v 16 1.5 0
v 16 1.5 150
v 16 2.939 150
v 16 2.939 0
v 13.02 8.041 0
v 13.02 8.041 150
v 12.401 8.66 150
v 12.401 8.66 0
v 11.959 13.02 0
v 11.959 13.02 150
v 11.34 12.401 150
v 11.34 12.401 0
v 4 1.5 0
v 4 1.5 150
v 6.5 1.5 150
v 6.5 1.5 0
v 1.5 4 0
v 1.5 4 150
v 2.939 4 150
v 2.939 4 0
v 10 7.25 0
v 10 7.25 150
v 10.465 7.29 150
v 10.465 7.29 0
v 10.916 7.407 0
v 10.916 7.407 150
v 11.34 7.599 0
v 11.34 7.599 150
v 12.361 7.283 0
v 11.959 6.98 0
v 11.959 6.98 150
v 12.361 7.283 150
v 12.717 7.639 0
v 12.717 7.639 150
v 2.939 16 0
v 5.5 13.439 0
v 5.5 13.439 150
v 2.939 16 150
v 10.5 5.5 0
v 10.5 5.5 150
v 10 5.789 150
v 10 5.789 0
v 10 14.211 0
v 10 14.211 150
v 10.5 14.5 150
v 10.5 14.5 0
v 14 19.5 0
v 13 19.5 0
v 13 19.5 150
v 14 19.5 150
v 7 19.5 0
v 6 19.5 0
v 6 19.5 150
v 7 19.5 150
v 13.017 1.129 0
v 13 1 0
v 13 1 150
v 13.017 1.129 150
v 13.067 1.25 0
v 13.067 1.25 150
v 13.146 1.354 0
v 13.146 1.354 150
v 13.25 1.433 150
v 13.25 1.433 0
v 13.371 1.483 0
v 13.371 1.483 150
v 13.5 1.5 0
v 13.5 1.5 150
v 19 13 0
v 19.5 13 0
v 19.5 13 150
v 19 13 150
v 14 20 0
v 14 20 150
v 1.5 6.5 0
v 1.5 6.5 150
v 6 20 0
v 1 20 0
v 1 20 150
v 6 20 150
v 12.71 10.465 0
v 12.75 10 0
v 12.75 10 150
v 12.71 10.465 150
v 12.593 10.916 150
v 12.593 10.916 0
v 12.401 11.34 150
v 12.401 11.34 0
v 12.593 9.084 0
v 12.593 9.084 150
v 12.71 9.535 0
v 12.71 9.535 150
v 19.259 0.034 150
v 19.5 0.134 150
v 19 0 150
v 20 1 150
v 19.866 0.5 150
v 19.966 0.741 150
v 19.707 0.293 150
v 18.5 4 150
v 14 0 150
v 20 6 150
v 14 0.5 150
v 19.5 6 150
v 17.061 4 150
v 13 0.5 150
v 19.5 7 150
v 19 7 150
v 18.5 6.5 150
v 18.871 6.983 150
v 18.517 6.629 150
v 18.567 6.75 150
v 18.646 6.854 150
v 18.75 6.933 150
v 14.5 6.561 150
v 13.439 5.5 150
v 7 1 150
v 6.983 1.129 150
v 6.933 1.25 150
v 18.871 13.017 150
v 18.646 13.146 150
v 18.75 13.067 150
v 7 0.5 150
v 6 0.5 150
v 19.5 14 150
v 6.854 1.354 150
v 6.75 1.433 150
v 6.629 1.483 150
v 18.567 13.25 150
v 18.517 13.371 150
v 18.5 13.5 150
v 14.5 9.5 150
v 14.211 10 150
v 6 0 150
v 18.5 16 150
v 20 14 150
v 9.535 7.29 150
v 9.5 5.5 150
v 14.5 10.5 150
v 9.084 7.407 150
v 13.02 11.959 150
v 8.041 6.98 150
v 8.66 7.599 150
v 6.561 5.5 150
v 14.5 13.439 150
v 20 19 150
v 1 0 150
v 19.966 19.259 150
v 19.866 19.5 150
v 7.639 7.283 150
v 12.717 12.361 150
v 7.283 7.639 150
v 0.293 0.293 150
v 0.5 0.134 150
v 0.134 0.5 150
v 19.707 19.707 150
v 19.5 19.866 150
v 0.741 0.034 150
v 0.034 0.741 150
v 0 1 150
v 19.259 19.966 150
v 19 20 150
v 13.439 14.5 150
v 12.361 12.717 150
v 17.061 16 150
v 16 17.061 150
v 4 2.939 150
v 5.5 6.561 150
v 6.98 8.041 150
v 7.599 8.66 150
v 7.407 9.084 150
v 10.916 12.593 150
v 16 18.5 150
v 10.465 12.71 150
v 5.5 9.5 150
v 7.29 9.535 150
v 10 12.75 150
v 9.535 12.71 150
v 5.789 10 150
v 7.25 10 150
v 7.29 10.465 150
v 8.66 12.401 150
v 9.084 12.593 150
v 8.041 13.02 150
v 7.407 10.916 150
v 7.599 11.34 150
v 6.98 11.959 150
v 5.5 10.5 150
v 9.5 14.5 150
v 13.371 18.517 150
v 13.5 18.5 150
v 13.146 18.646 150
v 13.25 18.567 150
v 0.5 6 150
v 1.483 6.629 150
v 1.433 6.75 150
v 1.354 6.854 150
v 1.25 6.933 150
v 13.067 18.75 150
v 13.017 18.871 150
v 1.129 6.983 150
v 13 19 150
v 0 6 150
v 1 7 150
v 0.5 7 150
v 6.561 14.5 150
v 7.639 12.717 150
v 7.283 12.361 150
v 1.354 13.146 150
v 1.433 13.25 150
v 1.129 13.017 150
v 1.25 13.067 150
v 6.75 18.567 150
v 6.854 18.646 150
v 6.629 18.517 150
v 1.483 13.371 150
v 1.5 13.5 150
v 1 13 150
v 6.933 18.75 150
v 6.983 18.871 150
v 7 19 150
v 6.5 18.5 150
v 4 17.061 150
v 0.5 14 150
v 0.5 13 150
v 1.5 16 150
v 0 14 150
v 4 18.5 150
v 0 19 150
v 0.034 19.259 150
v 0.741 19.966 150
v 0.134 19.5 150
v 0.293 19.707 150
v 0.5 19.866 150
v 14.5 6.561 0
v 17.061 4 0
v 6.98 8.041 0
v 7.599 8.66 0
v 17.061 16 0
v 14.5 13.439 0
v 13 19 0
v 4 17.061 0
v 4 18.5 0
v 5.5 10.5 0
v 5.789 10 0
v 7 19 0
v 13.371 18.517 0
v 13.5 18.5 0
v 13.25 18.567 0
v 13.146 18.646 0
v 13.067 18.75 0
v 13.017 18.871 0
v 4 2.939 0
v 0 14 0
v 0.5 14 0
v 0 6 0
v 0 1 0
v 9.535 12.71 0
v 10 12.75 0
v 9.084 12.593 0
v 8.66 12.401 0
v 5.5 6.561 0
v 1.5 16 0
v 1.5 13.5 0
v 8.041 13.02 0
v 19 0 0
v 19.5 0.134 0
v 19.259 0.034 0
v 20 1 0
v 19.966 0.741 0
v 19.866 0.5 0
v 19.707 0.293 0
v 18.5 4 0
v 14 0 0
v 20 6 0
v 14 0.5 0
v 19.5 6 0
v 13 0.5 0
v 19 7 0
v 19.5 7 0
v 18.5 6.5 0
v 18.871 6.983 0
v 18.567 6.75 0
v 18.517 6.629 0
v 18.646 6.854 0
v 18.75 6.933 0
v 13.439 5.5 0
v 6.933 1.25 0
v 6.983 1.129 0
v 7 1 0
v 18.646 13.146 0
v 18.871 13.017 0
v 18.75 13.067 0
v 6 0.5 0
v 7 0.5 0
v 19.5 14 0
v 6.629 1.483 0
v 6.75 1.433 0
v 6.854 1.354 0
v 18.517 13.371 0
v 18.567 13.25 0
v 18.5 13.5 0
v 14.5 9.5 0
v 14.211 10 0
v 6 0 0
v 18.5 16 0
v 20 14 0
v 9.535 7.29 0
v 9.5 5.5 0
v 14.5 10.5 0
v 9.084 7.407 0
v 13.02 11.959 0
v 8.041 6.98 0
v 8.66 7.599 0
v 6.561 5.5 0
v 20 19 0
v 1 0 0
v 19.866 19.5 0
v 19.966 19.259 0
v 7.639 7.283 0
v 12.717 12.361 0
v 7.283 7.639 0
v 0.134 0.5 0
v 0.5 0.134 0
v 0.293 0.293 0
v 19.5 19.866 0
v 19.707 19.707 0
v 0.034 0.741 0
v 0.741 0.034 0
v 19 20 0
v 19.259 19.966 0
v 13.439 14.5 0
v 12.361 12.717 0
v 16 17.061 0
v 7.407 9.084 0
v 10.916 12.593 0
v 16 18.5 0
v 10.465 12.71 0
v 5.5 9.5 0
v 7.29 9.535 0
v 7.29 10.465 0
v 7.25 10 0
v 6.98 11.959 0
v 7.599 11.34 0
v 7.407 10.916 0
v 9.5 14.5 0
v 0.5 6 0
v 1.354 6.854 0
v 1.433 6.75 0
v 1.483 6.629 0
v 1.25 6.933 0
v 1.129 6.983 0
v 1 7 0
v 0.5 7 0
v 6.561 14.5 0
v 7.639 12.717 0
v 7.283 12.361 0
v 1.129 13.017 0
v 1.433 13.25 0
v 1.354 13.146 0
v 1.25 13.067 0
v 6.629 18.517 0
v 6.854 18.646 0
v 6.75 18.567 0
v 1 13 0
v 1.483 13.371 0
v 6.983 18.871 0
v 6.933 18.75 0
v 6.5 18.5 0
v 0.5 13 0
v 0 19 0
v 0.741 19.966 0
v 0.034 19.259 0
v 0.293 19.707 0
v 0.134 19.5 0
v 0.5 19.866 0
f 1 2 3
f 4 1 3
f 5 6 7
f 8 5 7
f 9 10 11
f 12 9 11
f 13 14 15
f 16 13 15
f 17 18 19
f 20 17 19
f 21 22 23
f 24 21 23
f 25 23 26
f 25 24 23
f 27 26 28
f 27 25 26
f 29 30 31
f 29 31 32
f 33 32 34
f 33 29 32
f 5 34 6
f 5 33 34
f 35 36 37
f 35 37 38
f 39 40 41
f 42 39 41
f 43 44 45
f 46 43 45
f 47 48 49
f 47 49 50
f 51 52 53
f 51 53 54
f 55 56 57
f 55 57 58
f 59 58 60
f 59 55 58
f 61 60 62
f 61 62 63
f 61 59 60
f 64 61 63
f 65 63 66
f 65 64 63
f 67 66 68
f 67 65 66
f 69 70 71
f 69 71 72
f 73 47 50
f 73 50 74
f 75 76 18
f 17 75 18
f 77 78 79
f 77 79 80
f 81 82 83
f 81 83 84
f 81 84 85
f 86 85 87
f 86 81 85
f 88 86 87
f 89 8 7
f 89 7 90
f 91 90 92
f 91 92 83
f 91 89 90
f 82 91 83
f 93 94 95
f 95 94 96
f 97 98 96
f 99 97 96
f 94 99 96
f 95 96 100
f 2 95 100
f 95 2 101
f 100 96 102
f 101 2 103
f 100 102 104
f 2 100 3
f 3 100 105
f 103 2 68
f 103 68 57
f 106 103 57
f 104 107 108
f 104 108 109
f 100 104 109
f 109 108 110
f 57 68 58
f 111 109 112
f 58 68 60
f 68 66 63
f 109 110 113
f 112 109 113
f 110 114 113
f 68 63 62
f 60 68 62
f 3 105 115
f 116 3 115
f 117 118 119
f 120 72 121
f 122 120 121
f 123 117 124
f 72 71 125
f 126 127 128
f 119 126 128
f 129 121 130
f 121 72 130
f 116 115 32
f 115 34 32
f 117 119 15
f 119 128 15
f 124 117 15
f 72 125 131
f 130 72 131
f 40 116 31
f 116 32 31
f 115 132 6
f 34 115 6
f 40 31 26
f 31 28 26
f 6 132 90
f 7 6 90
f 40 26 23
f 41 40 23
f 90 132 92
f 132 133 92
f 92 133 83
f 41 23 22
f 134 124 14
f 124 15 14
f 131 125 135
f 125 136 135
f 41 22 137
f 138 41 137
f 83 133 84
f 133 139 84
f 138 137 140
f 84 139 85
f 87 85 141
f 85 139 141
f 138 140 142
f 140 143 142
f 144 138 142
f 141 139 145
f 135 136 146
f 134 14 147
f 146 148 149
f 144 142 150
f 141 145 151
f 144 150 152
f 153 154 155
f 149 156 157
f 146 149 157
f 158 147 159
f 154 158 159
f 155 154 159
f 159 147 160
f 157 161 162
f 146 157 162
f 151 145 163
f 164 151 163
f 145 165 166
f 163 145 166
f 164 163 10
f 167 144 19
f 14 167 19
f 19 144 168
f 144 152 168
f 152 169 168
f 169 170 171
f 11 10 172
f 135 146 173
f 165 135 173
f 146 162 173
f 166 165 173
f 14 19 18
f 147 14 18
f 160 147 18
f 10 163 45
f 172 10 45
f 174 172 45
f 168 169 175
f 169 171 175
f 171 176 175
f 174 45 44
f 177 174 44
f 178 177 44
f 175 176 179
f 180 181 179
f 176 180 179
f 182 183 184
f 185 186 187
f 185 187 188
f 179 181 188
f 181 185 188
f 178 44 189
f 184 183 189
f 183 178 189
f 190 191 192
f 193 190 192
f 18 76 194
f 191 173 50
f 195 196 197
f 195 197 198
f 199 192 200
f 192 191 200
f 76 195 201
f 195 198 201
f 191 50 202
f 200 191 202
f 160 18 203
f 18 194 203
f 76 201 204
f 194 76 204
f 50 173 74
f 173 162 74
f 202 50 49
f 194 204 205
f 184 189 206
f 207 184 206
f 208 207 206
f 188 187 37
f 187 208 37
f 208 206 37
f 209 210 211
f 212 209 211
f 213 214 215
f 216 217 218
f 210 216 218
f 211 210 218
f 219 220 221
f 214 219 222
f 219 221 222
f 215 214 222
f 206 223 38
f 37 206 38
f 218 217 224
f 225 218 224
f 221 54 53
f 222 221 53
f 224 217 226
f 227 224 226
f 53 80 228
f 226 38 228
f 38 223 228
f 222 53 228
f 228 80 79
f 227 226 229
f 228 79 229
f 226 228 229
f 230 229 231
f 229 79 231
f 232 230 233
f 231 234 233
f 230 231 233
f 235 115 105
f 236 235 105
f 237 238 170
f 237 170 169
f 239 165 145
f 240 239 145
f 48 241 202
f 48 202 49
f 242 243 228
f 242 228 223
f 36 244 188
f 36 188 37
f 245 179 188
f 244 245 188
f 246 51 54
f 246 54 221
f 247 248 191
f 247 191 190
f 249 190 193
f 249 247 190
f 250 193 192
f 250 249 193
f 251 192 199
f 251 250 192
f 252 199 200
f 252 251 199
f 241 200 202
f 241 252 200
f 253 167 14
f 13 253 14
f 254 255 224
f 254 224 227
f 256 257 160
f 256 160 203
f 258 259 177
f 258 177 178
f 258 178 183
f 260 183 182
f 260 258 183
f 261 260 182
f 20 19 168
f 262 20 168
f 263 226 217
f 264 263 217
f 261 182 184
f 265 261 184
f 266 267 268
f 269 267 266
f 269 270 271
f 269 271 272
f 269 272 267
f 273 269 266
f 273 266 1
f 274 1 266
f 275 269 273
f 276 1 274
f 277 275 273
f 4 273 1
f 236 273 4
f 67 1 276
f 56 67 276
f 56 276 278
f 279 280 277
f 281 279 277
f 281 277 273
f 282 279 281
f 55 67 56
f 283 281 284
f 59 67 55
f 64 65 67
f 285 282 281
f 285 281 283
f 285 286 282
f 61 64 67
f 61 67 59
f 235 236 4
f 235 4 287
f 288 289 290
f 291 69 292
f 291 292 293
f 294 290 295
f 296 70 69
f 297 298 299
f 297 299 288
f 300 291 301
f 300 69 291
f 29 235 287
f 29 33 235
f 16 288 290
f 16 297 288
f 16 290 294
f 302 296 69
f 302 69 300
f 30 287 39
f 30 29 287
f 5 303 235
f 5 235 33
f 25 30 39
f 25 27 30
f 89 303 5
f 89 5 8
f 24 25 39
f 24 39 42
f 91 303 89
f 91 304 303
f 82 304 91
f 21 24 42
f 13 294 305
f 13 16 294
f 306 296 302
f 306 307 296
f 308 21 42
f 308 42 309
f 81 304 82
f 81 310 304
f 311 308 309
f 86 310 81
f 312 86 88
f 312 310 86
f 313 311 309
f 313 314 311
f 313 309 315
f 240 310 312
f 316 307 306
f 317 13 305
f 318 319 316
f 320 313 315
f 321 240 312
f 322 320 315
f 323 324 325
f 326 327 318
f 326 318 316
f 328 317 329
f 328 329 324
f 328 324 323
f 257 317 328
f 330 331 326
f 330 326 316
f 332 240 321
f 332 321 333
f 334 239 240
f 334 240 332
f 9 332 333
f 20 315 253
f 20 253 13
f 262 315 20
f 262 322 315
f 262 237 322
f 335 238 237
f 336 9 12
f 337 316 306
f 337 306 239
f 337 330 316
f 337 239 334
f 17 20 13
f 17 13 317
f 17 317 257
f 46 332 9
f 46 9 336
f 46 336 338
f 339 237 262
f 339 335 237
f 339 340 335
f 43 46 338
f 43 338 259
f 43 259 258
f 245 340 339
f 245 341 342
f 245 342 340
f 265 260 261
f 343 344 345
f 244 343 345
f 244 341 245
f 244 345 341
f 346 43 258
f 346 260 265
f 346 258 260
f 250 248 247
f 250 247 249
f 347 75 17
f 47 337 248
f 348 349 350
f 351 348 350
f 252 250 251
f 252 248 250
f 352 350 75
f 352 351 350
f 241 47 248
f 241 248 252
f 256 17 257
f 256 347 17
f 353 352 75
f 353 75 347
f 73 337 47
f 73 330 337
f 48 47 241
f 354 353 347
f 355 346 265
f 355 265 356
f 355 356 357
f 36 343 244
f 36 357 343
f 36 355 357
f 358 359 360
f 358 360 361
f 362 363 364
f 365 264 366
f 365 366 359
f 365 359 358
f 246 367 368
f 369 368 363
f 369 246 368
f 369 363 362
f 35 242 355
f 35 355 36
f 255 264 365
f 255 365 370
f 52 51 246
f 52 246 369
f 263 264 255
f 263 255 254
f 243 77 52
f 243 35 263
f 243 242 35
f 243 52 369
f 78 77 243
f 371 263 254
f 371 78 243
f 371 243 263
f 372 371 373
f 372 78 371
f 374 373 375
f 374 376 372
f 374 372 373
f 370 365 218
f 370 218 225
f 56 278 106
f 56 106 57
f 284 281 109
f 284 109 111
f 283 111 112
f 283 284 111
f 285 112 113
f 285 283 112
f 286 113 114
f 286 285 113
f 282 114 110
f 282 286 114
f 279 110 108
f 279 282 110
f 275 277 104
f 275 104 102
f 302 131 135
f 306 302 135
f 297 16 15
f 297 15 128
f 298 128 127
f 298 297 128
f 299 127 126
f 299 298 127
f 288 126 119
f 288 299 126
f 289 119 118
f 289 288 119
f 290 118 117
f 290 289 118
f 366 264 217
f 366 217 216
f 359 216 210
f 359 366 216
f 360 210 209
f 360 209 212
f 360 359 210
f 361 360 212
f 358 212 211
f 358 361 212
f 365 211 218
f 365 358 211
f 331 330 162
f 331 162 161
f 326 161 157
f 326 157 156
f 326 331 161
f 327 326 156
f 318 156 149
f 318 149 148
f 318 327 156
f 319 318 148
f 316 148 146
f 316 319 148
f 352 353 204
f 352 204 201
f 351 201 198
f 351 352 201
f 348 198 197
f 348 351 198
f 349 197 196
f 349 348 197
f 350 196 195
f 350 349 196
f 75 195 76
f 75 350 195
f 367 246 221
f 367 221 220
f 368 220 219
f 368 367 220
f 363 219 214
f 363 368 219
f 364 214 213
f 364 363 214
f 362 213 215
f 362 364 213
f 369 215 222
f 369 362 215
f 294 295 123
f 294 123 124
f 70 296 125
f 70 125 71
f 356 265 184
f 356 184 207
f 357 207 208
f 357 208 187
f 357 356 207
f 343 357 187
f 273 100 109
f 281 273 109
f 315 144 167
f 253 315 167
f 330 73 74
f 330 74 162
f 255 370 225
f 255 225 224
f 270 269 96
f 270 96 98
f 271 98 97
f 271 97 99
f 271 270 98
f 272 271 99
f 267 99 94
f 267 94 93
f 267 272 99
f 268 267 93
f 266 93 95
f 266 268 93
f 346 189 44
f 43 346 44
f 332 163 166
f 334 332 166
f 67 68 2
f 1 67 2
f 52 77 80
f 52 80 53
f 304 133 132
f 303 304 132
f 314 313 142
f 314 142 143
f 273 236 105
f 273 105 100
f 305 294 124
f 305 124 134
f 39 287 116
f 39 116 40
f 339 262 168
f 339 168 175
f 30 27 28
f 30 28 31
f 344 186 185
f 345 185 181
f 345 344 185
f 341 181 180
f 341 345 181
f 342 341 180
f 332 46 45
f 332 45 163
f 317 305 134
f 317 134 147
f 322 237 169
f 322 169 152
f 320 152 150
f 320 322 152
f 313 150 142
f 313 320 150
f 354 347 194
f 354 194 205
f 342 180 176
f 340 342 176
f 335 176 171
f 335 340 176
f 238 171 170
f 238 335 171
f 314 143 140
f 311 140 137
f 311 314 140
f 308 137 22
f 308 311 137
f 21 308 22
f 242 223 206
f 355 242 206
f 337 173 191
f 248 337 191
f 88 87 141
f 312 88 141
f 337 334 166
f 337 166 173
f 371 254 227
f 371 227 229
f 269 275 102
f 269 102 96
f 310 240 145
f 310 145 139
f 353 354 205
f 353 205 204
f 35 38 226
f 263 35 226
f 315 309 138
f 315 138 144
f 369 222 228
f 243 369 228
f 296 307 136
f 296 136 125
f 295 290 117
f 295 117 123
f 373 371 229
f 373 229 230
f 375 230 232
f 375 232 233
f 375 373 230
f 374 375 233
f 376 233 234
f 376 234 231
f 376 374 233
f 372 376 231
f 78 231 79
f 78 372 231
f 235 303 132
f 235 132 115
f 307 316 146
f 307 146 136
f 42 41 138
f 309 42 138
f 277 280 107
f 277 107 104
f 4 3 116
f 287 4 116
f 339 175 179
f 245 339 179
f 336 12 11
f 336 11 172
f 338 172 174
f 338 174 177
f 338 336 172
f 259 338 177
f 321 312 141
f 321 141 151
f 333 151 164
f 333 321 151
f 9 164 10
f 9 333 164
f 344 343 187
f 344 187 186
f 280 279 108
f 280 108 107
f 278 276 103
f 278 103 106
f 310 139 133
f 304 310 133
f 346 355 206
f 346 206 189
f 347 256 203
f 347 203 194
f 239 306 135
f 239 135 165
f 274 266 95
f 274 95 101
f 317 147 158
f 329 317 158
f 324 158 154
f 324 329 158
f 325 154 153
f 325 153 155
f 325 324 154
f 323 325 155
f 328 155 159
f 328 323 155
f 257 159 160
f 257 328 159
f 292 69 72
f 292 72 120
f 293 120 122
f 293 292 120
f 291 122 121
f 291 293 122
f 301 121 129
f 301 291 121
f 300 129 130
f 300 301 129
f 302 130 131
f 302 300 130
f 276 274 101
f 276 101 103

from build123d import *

# Parameters (mm, degrees)
EXTRUDE_1_DEPTH = 150


with BuildPart() as part:
    # Эскиз1 → Бобышка-Вытянуть1 (new body)
    with BuildSketch(Plane.XY):
        with BuildLine():
            Line((1, 20), (6, 20))
            Line((6, 20), (6, 19.5))
            Line((6, 19.5), (7, 19.5))
            Line((7, 19.5), (7, 19))
            ThreePointArc((7, 19), (6.853553391, 18.646446609), (6.5, 18.5))
            Line((6.5, 18.5), (4, 18.5))
            Line((4, 18.5), (4, 17.060660172))
            Line((4, 17.060660172), (6.560660172, 14.5))
            Line((6.560660172, 14.5), (9.5, 14.5))
            Line((9.5, 14.5), (10, 14.211324865))
            Line((10, 14.211324865), (10.5, 14.5))
            Line((10.5, 14.5), (13.439339828, 14.5))
            Line((13.439339828, 14.5), (16, 17.060660172))
            Line((16, 17.060660172), (16, 18.5))
            Line((16, 18.5), (13.5, 18.5))
            ThreePointArc((13.5, 18.5), (13.146446609, 18.646446609), (13, 19))
            Line((13, 19), (13, 19.5))
            Line((13, 19.5), (14, 19.5))
            Line((14, 19.5), (14, 20))
            Line((14, 20), (19, 20))
            ThreePointArc((19, 20), (19.707106781, 19.707106781), (20, 19))
            Line((20, 19), (20, 14))
            Line((20, 14), (19.5, 14))
            Line((19.5, 14), (19.5, 13))
            Line((19.5, 13), (19, 13))
            ThreePointArc((19, 13), (18.646446609, 13.146446609), (18.5, 13.5))
            Line((18.5, 13.5), (18.5, 16))
            Line((18.5, 16), (17.060660172, 16))
            Line((17.060660172, 16), (14.5, 13.439339828))
            Line((14.5, 13.439339828), (14.5, 10.5))
            Line((14.5, 10.5), (14.211324865, 10))
            Line((14.211324865, 10), (14.5, 9.5))
            Line((14.5, 9.5), (14.5, 6.560660172))
            Line((14.5, 6.560660172), (17.060660172, 4))
            Line((17.060660172, 4), (18.5, 4))
            Line((18.5, 4), (18.5, 6.5))
            ThreePointArc((18.5, 6.5), (18.646446609, 6.853553391), (19, 7))
            Line((19, 7), (19.5, 7))
            Line((19.5, 7), (19.5, 6))
            Line((19.5, 6), (20, 6))
            Line((20, 6), (20, 1))
            ThreePointArc((20, 1), (19.707106781, 0.292893219), (19, 0))
            Line((19, 0), (14, 0))
            Line((14, 0), (14, 0.5))
            Line((14, 0.5), (13, 0.5))
            Line((13, 0.5), (13, 1))
            ThreePointArc((13, 1), (13.146446609, 1.353553391), (13.5, 1.5))
            Line((13.5, 1.5), (16, 1.5))
            Line((16, 1.5), (16, 2.939339828))
            Line((16, 2.939339828), (13.439339828, 5.5))
            Line((13.439339828, 5.5), (10.5, 5.5))
            Line((10.5, 5.5), (10, 5.788675135))
            Line((10, 5.788675135), (9.5, 5.5))
            Line((9.5, 5.5), (6.560660172, 5.5))
            Line((6.560660172, 5.5), (4, 2.939339828))
            Line((4, 2.939339828), (4, 1.5))
            Line((4, 1.5), (6.5, 1.5))
            ThreePointArc((6.5, 1.5), (6.853553391, 1.353553391), (7, 1))
            Line((7, 1), (7, 0.5))
            Line((7, 0.5), (6, 0.5))
            Line((6, 0.5), (6, 0))
            Line((6, 0), (1, 0))
            ThreePointArc((1, 0), (0.292893219, 0.292893219), (0, 1))
            Line((0, 1), (0, 6))
            Line((0, 6), (0.5, 6))
            Line((0.5, 6), (0.5, 7))
            Line((0.5, 7), (1, 7))
            ThreePointArc((1, 7), (1.353553391, 6.853553391), (1.5, 6.5))
            Line((1.5, 6.5), (1.5, 4))
            Line((1.5, 4), (2.939339828, 4))
            Line((2.939339828, 4), (5.5, 6.560660172))
            Line((5.5, 6.560660172), (5.5, 9.5))
            Line((5.5, 9.5), (5.788675135, 10))
            Line((5.788675135, 10), (5.5, 10.5))
            Line((5.5, 10.5), (5.5, 13.439339828))
            Line((5.5, 13.439339828), (2.939339828, 16))
            Line((2.939339828, 16), (1.5, 16))
            Line((1.5, 16), (1.5, 13.5))
            ThreePointArc((1.5, 13.5), (1.353553391, 13.146446609), (1, 13))
            Line((1, 13), (0.5, 13))
            Line((0.5, 13), (0.5, 14))
            Line((0.5, 14), (0, 14))
            Line((0, 14), (0, 19))
            ThreePointArc((0, 19), (0.292893219, 19.707106781), (1, 20))
        make_face()
        with BuildLine():
            Line((6.979941013, 11.959398815), (7.598841221, 11.340498607))
            ThreePointArc((7.598841221, 11.340498607), (7.338638822, 10.692572508), (7.25, 10))
            ThreePointArc((7.25, 10), (7.338638822, 9.307427492), (7.598841221, 8.659501393))
            Line((7.598841221, 8.659501393), (6.979941013, 8.040601185))
            ThreePointArc((6.979941013, 8.040601185), (7.454415588, 7.454415588), (8.040601185, 6.979941013))
            Line((8.040601185, 6.979941013), (8.659501393, 7.598841221))
            ThreePointArc((8.659501393, 7.598841221), (9.307427492, 7.338638822), (10, 7.25))
            ThreePointArc((10, 7.25), (10.692572508, 7.338638822), (11.340498607, 7.598841221))
            Line((11.340498607, 7.598841221), (11.959398815, 6.979941013))
            ThreePointArc((11.959398815, 6.979941013), (12.545584412, 7.454415588), (13.020058987, 8.040601185))
            Line((13.020058987, 8.040601185), (12.401158779, 8.659501393))
            ThreePointArc((12.401158779, 8.659501393), (12.661361178, 9.307427492), (12.75, 10))
            ThreePointArc((12.75, 10), (12.661361178, 10.692572508), (12.401158779, 11.340498607))
            Line((12.401158779, 11.340498607), (13.020058987, 11.959398815))
            ThreePointArc((13.020058987, 11.959398815), (12.545584412, 12.545584412), (11.959398815, 13.020058987))
            Line((11.959398815, 13.020058987), (11.340498607, 12.401158779))
            ThreePointArc((11.340498607, 12.401158779), (10.692572508, 12.661361178), (10, 12.75))
            ThreePointArc((10, 12.75), (9.307427492, 12.661361178), (8.659501393, 12.401158779))
            Line((8.659501393, 12.401158779), (8.040601185, 13.020058987))
            ThreePointArc((8.040601185, 13.020058987), (7.454415588, 12.545584412), (6.979941013, 11.959398815))
        make_face(mode=Mode.SUBTRACT)
    extrude(amount=EXTRUDE_1_DEPTH)


solid = part.part
